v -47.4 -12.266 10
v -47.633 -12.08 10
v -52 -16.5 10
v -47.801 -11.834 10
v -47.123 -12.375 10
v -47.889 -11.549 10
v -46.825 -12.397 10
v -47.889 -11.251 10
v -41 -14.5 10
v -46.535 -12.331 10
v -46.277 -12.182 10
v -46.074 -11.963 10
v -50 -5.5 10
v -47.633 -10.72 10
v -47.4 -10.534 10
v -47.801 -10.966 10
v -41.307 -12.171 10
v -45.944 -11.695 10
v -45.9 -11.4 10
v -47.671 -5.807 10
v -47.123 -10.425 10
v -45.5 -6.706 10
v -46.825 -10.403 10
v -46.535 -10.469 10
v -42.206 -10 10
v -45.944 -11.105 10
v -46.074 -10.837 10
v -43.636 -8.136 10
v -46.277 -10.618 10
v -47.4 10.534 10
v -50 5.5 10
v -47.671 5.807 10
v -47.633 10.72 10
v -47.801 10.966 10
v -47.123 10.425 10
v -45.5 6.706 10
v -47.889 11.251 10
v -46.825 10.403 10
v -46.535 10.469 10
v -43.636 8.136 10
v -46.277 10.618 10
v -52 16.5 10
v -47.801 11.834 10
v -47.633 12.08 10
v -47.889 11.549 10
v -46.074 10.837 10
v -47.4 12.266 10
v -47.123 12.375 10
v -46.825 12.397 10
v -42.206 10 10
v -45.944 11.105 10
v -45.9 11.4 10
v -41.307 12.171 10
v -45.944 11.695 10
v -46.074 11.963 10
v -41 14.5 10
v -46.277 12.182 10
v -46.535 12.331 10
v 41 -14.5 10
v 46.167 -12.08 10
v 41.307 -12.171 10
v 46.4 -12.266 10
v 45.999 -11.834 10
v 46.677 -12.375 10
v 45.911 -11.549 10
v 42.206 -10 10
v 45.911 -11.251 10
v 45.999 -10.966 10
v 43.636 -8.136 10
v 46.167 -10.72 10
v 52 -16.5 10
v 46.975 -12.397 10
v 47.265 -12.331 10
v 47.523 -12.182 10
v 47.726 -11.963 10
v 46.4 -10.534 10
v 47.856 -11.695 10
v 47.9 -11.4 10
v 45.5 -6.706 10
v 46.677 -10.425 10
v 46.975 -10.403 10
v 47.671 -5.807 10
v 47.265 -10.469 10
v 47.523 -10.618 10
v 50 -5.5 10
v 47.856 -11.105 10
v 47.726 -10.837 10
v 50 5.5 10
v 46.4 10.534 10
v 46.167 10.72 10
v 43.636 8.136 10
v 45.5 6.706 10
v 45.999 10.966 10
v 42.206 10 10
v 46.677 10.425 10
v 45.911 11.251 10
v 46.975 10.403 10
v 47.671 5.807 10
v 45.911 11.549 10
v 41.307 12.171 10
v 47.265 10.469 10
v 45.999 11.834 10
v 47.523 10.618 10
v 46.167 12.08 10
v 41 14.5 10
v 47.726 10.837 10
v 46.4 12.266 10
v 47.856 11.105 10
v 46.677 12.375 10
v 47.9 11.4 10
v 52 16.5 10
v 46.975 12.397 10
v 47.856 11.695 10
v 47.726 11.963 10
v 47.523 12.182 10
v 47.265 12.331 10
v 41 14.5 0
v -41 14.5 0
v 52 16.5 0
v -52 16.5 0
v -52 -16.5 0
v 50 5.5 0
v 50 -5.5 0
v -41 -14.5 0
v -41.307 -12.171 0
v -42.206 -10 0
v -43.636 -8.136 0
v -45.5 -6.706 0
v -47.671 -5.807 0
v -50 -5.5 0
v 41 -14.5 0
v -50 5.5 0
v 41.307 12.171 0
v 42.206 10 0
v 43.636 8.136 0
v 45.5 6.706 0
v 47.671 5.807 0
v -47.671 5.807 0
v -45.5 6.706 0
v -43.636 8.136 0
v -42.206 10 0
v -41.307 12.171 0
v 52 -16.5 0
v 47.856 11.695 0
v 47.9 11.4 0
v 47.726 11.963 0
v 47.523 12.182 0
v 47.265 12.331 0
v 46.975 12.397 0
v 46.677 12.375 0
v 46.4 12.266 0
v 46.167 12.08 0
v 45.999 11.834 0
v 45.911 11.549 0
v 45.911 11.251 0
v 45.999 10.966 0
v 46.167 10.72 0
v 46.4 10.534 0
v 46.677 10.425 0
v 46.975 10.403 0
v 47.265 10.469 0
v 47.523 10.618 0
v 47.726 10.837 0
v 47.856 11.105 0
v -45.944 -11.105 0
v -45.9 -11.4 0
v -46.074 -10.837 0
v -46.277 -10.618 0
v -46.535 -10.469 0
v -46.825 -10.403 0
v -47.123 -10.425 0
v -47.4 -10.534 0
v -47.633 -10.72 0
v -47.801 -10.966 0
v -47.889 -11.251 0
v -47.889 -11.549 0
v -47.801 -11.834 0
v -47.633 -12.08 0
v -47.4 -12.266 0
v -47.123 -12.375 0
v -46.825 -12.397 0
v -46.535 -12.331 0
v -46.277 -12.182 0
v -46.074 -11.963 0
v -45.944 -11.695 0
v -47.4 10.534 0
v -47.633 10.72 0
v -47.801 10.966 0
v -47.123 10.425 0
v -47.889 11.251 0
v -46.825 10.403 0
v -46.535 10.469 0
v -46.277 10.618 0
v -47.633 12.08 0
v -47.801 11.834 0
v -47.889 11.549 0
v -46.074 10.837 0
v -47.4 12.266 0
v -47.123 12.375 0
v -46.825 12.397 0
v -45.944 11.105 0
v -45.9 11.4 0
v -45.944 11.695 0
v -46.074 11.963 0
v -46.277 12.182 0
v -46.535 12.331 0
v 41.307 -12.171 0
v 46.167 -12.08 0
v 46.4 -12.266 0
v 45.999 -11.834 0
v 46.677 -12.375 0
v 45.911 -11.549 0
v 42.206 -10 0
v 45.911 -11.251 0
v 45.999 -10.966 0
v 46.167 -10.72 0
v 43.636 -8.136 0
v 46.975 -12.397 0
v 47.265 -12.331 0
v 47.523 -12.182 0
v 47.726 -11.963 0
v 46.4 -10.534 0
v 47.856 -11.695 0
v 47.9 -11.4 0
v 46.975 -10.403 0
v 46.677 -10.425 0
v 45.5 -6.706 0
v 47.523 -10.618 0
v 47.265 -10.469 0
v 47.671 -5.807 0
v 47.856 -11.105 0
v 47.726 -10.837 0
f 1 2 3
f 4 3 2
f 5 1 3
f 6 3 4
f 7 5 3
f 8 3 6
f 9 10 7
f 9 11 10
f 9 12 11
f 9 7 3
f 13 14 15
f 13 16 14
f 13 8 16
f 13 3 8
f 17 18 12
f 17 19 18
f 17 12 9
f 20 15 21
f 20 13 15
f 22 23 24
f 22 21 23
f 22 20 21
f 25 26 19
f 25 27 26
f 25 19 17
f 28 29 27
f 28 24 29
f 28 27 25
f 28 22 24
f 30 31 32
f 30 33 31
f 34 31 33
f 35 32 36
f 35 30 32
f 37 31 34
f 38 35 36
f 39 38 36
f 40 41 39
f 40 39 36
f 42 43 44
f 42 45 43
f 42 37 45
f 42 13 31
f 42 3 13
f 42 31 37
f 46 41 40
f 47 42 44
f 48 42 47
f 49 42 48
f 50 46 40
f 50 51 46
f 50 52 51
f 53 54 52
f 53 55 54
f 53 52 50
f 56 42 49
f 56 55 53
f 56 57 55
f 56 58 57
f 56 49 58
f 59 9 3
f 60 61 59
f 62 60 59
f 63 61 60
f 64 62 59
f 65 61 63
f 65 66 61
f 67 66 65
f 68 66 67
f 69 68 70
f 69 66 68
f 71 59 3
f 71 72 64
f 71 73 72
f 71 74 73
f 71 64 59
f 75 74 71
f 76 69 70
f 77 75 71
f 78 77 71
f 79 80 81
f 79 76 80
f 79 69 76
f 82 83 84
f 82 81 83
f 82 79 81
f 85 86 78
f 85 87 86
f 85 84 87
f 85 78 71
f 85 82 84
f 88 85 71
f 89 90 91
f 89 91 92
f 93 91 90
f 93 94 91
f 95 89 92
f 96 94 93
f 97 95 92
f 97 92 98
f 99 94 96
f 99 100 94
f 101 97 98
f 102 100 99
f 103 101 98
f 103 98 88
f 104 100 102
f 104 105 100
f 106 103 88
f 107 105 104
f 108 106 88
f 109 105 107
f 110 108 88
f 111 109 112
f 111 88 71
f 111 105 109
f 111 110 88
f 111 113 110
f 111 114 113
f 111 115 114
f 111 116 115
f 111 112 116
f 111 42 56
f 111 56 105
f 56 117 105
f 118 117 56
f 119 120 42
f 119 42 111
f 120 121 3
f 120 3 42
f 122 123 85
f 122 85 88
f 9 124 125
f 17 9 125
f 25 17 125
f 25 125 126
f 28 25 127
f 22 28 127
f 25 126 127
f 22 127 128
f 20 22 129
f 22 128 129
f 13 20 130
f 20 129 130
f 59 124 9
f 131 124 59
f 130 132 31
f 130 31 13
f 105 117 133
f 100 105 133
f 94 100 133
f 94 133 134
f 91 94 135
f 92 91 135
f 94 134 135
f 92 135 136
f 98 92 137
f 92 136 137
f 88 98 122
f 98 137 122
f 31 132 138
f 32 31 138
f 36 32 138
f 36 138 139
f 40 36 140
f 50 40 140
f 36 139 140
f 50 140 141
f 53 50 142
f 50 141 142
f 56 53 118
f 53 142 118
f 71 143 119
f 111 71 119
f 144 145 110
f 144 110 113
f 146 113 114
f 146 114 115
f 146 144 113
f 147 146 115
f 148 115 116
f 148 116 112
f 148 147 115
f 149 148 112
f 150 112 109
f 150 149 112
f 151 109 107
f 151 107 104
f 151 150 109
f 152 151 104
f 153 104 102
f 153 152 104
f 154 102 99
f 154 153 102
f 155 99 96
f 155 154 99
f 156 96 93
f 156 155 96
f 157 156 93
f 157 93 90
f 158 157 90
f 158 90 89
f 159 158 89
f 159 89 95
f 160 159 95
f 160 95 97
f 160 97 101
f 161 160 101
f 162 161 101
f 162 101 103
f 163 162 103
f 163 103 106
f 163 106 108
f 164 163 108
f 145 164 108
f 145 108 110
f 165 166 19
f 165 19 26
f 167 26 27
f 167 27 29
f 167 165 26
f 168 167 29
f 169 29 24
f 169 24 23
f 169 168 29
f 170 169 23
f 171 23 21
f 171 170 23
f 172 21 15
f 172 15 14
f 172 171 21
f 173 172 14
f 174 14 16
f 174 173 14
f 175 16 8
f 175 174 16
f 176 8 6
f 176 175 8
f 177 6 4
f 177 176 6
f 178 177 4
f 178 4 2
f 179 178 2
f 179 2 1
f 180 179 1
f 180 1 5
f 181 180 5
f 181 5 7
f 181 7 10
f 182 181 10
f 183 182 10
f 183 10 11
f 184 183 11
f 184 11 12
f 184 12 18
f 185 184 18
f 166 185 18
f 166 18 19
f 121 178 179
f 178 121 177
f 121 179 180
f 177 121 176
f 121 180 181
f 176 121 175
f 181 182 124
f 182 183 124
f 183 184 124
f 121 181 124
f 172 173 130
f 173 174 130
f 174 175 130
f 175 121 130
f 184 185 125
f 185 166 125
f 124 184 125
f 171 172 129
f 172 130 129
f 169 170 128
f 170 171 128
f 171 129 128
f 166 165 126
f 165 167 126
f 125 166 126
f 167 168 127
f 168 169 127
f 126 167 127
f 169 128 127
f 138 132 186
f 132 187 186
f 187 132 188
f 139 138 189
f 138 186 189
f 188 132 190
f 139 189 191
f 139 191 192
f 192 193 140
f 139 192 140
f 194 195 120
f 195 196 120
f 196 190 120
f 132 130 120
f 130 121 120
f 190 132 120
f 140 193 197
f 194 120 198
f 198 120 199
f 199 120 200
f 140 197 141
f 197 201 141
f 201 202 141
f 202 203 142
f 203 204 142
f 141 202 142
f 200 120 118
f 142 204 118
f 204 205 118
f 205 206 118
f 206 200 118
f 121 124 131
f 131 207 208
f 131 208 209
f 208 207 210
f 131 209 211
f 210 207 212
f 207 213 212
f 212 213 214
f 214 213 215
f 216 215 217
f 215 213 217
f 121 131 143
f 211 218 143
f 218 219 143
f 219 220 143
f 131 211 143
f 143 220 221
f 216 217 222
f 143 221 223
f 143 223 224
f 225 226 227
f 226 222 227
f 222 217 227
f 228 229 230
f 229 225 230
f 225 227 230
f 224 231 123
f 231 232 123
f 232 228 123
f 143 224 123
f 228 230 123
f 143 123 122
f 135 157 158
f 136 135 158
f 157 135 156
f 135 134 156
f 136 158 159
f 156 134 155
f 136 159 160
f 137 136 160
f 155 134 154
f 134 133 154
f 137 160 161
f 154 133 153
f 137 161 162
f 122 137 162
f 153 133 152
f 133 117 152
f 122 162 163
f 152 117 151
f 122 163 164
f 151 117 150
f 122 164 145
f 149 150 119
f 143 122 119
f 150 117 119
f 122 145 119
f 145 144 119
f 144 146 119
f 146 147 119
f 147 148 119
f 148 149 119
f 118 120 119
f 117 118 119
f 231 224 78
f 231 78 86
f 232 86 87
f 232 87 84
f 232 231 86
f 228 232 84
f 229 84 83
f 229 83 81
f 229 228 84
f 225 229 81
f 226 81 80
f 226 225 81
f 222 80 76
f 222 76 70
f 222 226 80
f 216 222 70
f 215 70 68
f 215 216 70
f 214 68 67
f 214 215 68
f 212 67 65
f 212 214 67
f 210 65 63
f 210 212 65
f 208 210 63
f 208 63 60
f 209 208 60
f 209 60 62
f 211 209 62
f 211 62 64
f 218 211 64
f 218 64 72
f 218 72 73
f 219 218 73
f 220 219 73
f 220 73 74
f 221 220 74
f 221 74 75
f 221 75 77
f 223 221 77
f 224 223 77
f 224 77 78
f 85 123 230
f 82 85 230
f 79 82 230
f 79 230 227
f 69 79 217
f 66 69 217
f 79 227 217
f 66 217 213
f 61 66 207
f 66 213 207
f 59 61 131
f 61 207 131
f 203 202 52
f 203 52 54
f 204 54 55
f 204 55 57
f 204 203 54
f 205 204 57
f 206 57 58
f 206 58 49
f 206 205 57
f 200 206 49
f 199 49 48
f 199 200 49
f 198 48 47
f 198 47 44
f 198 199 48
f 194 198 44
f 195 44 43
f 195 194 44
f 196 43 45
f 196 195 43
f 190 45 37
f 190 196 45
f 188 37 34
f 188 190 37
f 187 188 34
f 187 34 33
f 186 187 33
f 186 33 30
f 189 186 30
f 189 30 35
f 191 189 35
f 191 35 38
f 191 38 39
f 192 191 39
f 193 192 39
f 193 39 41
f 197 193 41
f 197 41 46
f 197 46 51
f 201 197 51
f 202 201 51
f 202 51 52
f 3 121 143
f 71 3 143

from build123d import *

# Parameters (mm, degrees)
SKETCH_W     = 104
SKETCH_H     = 33
SKETCH_R     = 1
PAD_DEPTH    = 2
PAD001_DEPTH = 10


with BuildPart() as part:
    # Sketch → Pad (new body)
    with BuildSketch(Plane.XY):
        Rectangle(SKETCH_W, SKETCH_H)
        with Locations((46.9, -11.4)):
            Circle(SKETCH_R, mode=Mode.SUBTRACT)
        with Locations((-46.9, -11.4)):
            Circle(SKETCH_R, mode=Mode.SUBTRACT)
        with Locations((-46.9, 11.4)):
            Circle(SKETCH_R, mode=Mode.SUBTRACT)
        with Locations((46.9, 11.4)):
            Circle(SKETCH_R, mode=Mode.SUBTRACT)
        with BuildLine():
            ThreePointArc((-50, 5.5), (-43.636039, 8.136039), (-41, 14.5))
            Line((41, 14.5), (-41, 14.5))
            ThreePointArc((41, 14.5), (43.636039, 8.136039), (50, 5.5))
            Line((50, -5.5), (50, 5.5))
            ThreePointArc((50, -5.5), (43.636039, -8.136039), (41, -14.5))
            Line((-41, -14.5), (41, -14.5))
            ThreePointArc((-41, -14.5), (-43.636039, -8.136039), (-50, -5.5))
            Line((-50, 5.5), (-50, -5.5))
        make_face(mode=Mode.SUBTRACT)
    extrude(amount=PAD_DEPTH)

    # Sketch → Pad001 (join)
    with BuildSketch(Plane.XY):
        Rectangle(SKETCH_W, SKETCH_H)
        with Locations((46.9, -11.4)):
            Circle(SKETCH_R, mode=Mode.SUBTRACT)
        with Locations((-46.9, -11.4)):
            Circle(SKETCH_R, mode=Mode.SUBTRACT)
        with Locations((-46.9, 11.4)):
            Circle(SKETCH_R, mode=Mode.SUBTRACT)
        with Locations((46.9, 11.4)):
            Circle(SKETCH_R, mode=Mode.SUBTRACT)
        with BuildLine():
            ThreePointArc((-50, 5.5), (-43.636039, 8.136039), (-41, 14.5))
            Line((41, 14.5), (-41, 14.5))
            ThreePointArc((41, 14.5), (43.636039, 8.136039), (50, 5.5))
            Line((50, -5.5), (50, 5.5))
            ThreePointArc((50, -5.5), (43.636039, -8.136039), (41, -14.5))
            Line((-41, -14.5), (41, -14.5))
            ThreePointArc((-41, -14.5), (-43.636039, -8.136039), (-50, -5.5))
            Line((-50, 5.5), (-50, -5.5))
        make_face(mode=Mode.SUBTRACT)
    extrude(amount=PAD001_DEPTH)


solid = part.part
